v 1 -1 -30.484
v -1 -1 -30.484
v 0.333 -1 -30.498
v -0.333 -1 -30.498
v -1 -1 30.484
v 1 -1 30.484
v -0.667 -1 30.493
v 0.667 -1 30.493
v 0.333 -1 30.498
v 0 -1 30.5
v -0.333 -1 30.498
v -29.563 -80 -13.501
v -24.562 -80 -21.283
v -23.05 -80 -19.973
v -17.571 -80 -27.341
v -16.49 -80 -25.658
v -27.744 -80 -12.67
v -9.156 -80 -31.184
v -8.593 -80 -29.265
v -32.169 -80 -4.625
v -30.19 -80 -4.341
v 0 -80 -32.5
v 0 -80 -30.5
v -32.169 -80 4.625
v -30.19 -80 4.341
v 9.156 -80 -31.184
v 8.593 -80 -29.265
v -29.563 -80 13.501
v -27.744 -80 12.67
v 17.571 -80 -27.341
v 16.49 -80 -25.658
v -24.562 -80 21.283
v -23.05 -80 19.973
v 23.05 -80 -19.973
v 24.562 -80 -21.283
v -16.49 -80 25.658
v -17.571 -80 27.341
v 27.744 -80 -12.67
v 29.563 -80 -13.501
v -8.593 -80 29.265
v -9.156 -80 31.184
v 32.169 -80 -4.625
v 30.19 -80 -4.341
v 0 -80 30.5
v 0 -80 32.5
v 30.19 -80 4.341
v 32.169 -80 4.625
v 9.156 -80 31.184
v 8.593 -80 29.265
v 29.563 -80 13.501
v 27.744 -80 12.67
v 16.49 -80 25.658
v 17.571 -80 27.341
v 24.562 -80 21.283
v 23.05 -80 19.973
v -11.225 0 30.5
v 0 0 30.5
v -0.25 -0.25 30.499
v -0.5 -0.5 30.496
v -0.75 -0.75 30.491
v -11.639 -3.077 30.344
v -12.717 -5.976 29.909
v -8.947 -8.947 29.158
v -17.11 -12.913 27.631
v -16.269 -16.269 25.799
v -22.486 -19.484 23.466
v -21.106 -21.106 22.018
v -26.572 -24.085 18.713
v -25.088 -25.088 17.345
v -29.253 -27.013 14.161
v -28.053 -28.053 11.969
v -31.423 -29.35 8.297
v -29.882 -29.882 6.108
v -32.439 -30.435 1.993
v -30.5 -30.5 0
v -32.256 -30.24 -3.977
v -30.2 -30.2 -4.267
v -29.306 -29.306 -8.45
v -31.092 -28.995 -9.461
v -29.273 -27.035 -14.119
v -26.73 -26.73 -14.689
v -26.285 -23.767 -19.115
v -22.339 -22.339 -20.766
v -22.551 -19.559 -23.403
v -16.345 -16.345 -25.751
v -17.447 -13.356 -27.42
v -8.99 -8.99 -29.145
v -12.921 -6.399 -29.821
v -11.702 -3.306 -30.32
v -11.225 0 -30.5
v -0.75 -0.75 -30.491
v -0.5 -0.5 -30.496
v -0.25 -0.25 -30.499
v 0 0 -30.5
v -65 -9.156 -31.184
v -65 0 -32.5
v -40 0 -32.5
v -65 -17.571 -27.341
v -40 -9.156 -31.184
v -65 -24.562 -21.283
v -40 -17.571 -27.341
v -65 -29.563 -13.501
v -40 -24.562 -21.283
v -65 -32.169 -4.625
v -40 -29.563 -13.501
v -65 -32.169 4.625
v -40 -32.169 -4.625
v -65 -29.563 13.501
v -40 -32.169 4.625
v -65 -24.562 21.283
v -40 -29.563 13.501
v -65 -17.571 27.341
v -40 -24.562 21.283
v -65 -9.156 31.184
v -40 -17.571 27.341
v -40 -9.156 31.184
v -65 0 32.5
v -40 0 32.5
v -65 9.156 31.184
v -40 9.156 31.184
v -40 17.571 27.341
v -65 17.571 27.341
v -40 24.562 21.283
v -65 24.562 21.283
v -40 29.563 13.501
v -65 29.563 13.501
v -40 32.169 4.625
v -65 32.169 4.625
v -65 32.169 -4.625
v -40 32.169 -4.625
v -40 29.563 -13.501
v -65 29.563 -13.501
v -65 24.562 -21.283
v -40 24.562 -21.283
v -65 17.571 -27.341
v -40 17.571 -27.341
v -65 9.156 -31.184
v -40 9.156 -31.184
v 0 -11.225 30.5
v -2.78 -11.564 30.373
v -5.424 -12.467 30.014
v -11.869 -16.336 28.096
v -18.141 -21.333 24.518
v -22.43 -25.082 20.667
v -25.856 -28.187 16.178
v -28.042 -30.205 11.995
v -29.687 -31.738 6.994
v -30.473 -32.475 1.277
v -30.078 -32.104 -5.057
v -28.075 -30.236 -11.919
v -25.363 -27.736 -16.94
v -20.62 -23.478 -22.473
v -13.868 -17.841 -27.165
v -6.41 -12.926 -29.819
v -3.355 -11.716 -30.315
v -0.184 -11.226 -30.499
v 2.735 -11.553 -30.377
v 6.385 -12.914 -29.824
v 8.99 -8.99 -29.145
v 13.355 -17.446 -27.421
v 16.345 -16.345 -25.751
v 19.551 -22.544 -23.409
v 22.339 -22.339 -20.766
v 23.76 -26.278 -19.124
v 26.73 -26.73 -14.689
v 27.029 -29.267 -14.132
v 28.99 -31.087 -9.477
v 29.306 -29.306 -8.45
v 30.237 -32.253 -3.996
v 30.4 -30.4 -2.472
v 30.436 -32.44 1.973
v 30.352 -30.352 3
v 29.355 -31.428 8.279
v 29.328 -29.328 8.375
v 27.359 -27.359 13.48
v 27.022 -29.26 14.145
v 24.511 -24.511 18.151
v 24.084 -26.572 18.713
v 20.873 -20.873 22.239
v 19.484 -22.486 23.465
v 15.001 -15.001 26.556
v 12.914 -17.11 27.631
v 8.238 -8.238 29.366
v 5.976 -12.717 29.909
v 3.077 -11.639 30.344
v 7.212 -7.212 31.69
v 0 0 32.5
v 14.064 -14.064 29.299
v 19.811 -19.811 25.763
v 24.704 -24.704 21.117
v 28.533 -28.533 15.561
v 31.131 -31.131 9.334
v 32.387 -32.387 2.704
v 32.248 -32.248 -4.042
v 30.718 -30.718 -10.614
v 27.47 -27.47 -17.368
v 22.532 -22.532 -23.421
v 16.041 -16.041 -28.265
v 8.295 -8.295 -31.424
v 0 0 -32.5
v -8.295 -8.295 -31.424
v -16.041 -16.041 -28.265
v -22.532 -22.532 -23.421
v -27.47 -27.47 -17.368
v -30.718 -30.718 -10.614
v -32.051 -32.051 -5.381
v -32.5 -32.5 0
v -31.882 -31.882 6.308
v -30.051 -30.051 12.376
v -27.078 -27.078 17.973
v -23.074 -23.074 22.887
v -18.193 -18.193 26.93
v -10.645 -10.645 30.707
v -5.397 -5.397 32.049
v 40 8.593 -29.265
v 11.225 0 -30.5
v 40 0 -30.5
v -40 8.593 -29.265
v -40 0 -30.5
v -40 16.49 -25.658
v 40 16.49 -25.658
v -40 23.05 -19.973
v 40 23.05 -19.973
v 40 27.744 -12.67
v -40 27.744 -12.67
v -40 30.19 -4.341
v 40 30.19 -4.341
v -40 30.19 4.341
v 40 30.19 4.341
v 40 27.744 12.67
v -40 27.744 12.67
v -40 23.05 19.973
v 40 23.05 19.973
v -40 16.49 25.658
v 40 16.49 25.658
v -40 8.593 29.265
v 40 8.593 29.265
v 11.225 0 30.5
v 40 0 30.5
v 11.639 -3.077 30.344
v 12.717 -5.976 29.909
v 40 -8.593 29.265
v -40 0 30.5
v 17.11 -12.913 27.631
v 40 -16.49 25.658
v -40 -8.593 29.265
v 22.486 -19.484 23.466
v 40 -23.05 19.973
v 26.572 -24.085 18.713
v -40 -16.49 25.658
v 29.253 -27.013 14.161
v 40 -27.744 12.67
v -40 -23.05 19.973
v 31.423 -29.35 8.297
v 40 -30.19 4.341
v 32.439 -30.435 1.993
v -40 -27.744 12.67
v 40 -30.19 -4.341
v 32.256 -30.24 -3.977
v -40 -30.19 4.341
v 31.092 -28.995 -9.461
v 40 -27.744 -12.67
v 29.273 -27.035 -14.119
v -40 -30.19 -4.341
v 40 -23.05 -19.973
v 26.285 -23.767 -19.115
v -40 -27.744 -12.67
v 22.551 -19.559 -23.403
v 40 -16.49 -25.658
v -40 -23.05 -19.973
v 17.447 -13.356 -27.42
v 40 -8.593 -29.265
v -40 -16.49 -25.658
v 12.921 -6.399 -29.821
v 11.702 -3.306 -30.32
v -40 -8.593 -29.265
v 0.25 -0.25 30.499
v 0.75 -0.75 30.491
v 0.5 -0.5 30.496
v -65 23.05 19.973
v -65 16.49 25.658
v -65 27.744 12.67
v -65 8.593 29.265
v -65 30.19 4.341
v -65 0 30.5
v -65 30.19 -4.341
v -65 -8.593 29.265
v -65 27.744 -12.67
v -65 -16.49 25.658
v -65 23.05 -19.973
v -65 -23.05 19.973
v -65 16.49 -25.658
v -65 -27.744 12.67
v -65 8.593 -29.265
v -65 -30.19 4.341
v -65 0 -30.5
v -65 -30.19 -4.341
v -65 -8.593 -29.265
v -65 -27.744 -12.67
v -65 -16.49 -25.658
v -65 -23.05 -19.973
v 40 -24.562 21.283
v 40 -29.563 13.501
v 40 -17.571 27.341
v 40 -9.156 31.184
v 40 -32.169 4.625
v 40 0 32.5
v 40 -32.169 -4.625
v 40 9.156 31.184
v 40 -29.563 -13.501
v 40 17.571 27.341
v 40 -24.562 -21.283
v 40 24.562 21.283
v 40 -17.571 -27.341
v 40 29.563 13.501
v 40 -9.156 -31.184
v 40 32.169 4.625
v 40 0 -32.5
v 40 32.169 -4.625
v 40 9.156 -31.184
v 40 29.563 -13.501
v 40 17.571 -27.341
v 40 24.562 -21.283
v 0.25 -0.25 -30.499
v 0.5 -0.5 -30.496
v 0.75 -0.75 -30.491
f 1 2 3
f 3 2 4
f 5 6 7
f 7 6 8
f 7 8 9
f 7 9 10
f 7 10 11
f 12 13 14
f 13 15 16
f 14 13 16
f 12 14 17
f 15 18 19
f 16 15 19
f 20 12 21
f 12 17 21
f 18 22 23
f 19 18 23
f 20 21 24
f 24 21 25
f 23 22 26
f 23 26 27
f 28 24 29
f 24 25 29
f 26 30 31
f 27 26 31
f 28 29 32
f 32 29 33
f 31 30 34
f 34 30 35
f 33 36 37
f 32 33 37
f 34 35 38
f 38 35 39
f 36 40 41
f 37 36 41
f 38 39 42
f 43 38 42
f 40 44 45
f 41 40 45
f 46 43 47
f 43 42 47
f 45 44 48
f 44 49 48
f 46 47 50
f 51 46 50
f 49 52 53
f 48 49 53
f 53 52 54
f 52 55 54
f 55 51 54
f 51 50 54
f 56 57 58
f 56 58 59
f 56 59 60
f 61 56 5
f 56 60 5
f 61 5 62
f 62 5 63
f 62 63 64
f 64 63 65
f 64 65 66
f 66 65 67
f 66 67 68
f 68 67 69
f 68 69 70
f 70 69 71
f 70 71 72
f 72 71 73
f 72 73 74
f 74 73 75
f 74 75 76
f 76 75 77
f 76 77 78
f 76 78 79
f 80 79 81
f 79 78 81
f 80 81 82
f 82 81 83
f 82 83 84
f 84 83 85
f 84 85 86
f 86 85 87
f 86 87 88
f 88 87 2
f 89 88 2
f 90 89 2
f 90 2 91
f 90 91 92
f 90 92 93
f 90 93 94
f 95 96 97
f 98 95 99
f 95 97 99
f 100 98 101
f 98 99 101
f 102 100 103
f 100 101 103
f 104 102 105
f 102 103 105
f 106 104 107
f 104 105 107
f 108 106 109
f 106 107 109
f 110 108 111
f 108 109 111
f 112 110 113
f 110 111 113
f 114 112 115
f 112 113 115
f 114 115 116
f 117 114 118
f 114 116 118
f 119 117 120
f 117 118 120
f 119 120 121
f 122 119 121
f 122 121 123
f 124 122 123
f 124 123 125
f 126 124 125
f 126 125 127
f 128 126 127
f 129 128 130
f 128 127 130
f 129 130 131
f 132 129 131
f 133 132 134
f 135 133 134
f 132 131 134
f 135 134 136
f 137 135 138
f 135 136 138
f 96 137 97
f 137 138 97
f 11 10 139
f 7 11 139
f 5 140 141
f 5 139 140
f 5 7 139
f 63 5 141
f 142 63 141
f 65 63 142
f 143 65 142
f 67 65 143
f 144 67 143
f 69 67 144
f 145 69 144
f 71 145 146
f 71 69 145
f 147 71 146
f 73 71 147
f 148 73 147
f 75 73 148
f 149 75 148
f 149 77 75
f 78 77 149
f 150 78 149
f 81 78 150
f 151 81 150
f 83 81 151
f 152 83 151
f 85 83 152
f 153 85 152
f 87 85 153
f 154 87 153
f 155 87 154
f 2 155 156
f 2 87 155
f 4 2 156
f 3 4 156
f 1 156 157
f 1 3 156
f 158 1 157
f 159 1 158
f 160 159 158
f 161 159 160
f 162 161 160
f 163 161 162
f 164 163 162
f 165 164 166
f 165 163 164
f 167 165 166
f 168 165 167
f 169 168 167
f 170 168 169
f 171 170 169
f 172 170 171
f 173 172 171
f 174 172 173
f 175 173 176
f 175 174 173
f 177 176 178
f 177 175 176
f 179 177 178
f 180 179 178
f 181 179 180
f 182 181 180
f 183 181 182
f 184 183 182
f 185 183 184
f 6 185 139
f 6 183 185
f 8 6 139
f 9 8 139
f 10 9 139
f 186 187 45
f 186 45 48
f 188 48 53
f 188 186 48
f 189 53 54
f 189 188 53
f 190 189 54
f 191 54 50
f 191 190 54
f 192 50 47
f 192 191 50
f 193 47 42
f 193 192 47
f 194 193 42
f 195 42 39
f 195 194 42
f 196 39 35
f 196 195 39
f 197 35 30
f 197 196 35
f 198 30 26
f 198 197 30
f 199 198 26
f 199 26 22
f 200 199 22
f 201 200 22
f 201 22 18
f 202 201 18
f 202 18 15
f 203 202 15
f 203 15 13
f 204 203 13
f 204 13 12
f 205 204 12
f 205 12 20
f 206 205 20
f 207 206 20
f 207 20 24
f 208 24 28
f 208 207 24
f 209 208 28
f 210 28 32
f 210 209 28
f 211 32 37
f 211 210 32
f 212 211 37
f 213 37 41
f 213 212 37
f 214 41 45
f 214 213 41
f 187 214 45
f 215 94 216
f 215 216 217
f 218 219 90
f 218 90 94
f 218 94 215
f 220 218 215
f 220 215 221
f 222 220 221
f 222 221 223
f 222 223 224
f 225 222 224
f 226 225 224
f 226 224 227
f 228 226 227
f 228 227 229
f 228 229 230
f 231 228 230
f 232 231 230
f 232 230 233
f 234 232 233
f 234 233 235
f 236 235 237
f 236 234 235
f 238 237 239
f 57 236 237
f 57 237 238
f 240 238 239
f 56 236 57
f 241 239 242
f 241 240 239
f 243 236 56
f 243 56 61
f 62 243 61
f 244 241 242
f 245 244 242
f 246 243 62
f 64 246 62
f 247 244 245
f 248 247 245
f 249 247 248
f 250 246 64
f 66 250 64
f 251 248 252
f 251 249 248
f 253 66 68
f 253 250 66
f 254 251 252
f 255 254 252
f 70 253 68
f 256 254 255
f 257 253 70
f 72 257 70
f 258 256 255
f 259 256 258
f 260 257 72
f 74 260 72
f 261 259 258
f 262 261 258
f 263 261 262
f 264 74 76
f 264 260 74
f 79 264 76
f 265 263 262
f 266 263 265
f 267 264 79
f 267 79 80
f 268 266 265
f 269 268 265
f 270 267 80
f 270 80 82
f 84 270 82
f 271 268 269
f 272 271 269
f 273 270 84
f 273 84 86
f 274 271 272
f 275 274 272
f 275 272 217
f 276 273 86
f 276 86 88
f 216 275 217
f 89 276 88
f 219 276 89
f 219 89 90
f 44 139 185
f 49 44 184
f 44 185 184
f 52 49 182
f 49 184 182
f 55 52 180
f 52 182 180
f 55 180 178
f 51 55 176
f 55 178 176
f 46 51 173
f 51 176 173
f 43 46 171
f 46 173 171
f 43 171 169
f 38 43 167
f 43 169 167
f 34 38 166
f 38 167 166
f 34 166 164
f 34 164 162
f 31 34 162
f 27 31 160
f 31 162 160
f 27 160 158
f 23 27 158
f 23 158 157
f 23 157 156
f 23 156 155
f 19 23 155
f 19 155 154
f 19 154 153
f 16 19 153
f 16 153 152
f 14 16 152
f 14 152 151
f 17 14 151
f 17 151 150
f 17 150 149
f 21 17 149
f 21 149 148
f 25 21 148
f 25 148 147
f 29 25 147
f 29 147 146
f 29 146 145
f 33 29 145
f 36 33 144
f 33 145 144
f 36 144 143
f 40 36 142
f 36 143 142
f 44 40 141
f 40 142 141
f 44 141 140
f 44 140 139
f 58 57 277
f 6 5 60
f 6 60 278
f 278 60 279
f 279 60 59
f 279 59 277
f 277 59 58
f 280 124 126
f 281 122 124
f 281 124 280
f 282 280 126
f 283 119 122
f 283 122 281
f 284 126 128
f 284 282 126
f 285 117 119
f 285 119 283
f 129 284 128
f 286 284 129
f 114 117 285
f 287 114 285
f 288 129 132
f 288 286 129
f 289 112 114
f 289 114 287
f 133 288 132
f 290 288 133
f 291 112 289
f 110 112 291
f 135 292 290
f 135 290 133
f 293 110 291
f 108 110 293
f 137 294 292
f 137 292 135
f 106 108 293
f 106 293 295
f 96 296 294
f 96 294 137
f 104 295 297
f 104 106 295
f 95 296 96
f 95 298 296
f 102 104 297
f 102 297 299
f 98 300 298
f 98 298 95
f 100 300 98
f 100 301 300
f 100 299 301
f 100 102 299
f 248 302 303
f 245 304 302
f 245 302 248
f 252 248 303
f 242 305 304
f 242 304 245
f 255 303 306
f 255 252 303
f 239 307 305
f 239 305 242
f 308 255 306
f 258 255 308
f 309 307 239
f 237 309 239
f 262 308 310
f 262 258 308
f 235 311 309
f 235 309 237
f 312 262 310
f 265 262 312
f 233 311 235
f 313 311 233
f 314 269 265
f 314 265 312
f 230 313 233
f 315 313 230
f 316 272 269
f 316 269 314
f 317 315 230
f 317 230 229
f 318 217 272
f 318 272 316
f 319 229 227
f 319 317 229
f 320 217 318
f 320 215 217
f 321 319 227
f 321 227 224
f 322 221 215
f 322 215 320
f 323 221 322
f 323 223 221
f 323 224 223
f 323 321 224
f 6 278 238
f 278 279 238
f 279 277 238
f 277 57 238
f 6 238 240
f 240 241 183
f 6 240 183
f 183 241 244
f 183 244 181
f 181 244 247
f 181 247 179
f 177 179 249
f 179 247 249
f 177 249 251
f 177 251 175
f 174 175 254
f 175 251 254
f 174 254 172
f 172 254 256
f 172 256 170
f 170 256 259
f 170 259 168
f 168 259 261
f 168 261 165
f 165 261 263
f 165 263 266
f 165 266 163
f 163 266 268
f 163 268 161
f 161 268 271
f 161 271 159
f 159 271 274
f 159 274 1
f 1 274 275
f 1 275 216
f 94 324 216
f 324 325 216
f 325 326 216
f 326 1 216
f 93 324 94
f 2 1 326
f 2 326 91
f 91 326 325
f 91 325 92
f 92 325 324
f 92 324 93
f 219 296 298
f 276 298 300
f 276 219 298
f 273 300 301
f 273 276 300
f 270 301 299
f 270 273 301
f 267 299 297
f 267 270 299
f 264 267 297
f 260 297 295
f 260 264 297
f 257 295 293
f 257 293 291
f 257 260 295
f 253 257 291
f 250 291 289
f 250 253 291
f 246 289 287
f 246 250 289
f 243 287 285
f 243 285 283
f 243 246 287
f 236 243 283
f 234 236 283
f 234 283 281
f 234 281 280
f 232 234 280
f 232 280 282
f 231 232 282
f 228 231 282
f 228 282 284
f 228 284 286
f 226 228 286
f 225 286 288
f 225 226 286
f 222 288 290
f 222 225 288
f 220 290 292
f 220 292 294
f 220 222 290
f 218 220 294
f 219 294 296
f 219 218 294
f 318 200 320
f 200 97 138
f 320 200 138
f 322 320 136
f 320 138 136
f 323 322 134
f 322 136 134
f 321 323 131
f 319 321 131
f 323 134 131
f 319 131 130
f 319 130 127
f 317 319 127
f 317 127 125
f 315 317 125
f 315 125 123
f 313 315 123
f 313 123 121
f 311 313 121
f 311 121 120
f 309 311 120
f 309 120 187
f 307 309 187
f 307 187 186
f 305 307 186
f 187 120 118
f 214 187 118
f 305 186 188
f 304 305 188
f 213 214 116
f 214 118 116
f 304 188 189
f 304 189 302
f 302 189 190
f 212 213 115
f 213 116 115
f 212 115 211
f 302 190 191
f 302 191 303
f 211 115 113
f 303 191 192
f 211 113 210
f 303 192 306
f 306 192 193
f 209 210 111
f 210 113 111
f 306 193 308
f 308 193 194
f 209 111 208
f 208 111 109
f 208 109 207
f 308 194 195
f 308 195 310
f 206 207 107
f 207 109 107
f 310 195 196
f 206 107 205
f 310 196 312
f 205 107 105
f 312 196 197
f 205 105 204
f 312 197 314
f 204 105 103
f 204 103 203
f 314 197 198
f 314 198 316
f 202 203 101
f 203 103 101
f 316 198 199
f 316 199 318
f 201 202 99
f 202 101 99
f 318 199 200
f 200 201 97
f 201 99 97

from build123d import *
from build123d.topology import SkipClean

# Parameters (mm, degrees)
BOSS_EXTRUDE1_DEPTH      = 40
BOSS_EXTRUDE1_DEPTH_BACK = 40
SKETCH1_R                = 32.5
SKETCH1_R_2              = 30.5
SKETCH2_R                = 32.5
SKETCH2_R_2              = 30.5
BOSS_EXTRUDE2_DEPTH      = 80
SKETCH3_R                = 30.5
CUT_EXTRUDE1_DEPTH       = 80
CUT_EXTRUDE2_START       = -79
SKETCH4_R                = 30.5
CUT_EXTRUDE2_DEPTH       = 79
SKETCH5_R                = 32.5
SKETCH5_R_2              = 30.5
BOSS_EXTRUDE3_DEPTH      = 25


with BuildPart() as part:
    # Sketch1 → Boss-Extrude1 (new, two sides: drawn at the far end of the back side and taken through both)
    with BuildSketch(Plane(origin=(0, 0, 0), x_dir=(0, 0, -1), z_dir=(1, 0, 0)).offset(-BOSS_EXTRUDE1_DEPTH_BACK)):
        Circle(SKETCH1_R)
        Circle(SKETCH1_R_2, mode=Mode.SUBTRACT)
    extrude(amount=BOSS_EXTRUDE1_DEPTH + BOSS_EXTRUDE1_DEPTH_BACK)

    # Sketch2 → Boss-Extrude2 (add)
    with BuildSketch(Plane(origin=(0, 0, 0), x_dir=(1, 0, 0), z_dir=(0, 1, 0))):
        Circle(SKETCH2_R)
        Circle(SKETCH2_R_2, mode=Mode.SUBTRACT)
    extrude(amount=-BOSS_EXTRUDE2_DEPTH)

    # Sketch3 → Cut-Extrude1 (cut)
    with BuildSketch(Plane(origin=(40, 0, 0), x_dir=(0, 0, -1), z_dir=(1, 0, 0))):
        Circle(SKETCH3_R)
    extrude(amount=-CUT_EXTRUDE1_DEPTH, mode=Mode.SUBTRACT)

    # Sketch4 → Cut-Extrude2 (cut)
    with SkipClean():  # the faces are left unmerged after this step: merging them gives an invalid solid
        with BuildSketch(Plane.XZ.offset(80).offset(CUT_EXTRUDE2_START)):
            Circle(SKETCH4_R)
        extrude(amount=CUT_EXTRUDE2_DEPTH, mode=Mode.SUBTRACT)

    # Sketch5 → Boss-Extrude3 (add)
    with BuildSketch(Plane.ZY.offset(40)):
        Circle(SKETCH5_R)
        Circle(SKETCH5_R_2, mode=Mode.SUBTRACT)
    extrude(amount=BOSS_EXTRUDE3_DEPTH)


solid = part.part
